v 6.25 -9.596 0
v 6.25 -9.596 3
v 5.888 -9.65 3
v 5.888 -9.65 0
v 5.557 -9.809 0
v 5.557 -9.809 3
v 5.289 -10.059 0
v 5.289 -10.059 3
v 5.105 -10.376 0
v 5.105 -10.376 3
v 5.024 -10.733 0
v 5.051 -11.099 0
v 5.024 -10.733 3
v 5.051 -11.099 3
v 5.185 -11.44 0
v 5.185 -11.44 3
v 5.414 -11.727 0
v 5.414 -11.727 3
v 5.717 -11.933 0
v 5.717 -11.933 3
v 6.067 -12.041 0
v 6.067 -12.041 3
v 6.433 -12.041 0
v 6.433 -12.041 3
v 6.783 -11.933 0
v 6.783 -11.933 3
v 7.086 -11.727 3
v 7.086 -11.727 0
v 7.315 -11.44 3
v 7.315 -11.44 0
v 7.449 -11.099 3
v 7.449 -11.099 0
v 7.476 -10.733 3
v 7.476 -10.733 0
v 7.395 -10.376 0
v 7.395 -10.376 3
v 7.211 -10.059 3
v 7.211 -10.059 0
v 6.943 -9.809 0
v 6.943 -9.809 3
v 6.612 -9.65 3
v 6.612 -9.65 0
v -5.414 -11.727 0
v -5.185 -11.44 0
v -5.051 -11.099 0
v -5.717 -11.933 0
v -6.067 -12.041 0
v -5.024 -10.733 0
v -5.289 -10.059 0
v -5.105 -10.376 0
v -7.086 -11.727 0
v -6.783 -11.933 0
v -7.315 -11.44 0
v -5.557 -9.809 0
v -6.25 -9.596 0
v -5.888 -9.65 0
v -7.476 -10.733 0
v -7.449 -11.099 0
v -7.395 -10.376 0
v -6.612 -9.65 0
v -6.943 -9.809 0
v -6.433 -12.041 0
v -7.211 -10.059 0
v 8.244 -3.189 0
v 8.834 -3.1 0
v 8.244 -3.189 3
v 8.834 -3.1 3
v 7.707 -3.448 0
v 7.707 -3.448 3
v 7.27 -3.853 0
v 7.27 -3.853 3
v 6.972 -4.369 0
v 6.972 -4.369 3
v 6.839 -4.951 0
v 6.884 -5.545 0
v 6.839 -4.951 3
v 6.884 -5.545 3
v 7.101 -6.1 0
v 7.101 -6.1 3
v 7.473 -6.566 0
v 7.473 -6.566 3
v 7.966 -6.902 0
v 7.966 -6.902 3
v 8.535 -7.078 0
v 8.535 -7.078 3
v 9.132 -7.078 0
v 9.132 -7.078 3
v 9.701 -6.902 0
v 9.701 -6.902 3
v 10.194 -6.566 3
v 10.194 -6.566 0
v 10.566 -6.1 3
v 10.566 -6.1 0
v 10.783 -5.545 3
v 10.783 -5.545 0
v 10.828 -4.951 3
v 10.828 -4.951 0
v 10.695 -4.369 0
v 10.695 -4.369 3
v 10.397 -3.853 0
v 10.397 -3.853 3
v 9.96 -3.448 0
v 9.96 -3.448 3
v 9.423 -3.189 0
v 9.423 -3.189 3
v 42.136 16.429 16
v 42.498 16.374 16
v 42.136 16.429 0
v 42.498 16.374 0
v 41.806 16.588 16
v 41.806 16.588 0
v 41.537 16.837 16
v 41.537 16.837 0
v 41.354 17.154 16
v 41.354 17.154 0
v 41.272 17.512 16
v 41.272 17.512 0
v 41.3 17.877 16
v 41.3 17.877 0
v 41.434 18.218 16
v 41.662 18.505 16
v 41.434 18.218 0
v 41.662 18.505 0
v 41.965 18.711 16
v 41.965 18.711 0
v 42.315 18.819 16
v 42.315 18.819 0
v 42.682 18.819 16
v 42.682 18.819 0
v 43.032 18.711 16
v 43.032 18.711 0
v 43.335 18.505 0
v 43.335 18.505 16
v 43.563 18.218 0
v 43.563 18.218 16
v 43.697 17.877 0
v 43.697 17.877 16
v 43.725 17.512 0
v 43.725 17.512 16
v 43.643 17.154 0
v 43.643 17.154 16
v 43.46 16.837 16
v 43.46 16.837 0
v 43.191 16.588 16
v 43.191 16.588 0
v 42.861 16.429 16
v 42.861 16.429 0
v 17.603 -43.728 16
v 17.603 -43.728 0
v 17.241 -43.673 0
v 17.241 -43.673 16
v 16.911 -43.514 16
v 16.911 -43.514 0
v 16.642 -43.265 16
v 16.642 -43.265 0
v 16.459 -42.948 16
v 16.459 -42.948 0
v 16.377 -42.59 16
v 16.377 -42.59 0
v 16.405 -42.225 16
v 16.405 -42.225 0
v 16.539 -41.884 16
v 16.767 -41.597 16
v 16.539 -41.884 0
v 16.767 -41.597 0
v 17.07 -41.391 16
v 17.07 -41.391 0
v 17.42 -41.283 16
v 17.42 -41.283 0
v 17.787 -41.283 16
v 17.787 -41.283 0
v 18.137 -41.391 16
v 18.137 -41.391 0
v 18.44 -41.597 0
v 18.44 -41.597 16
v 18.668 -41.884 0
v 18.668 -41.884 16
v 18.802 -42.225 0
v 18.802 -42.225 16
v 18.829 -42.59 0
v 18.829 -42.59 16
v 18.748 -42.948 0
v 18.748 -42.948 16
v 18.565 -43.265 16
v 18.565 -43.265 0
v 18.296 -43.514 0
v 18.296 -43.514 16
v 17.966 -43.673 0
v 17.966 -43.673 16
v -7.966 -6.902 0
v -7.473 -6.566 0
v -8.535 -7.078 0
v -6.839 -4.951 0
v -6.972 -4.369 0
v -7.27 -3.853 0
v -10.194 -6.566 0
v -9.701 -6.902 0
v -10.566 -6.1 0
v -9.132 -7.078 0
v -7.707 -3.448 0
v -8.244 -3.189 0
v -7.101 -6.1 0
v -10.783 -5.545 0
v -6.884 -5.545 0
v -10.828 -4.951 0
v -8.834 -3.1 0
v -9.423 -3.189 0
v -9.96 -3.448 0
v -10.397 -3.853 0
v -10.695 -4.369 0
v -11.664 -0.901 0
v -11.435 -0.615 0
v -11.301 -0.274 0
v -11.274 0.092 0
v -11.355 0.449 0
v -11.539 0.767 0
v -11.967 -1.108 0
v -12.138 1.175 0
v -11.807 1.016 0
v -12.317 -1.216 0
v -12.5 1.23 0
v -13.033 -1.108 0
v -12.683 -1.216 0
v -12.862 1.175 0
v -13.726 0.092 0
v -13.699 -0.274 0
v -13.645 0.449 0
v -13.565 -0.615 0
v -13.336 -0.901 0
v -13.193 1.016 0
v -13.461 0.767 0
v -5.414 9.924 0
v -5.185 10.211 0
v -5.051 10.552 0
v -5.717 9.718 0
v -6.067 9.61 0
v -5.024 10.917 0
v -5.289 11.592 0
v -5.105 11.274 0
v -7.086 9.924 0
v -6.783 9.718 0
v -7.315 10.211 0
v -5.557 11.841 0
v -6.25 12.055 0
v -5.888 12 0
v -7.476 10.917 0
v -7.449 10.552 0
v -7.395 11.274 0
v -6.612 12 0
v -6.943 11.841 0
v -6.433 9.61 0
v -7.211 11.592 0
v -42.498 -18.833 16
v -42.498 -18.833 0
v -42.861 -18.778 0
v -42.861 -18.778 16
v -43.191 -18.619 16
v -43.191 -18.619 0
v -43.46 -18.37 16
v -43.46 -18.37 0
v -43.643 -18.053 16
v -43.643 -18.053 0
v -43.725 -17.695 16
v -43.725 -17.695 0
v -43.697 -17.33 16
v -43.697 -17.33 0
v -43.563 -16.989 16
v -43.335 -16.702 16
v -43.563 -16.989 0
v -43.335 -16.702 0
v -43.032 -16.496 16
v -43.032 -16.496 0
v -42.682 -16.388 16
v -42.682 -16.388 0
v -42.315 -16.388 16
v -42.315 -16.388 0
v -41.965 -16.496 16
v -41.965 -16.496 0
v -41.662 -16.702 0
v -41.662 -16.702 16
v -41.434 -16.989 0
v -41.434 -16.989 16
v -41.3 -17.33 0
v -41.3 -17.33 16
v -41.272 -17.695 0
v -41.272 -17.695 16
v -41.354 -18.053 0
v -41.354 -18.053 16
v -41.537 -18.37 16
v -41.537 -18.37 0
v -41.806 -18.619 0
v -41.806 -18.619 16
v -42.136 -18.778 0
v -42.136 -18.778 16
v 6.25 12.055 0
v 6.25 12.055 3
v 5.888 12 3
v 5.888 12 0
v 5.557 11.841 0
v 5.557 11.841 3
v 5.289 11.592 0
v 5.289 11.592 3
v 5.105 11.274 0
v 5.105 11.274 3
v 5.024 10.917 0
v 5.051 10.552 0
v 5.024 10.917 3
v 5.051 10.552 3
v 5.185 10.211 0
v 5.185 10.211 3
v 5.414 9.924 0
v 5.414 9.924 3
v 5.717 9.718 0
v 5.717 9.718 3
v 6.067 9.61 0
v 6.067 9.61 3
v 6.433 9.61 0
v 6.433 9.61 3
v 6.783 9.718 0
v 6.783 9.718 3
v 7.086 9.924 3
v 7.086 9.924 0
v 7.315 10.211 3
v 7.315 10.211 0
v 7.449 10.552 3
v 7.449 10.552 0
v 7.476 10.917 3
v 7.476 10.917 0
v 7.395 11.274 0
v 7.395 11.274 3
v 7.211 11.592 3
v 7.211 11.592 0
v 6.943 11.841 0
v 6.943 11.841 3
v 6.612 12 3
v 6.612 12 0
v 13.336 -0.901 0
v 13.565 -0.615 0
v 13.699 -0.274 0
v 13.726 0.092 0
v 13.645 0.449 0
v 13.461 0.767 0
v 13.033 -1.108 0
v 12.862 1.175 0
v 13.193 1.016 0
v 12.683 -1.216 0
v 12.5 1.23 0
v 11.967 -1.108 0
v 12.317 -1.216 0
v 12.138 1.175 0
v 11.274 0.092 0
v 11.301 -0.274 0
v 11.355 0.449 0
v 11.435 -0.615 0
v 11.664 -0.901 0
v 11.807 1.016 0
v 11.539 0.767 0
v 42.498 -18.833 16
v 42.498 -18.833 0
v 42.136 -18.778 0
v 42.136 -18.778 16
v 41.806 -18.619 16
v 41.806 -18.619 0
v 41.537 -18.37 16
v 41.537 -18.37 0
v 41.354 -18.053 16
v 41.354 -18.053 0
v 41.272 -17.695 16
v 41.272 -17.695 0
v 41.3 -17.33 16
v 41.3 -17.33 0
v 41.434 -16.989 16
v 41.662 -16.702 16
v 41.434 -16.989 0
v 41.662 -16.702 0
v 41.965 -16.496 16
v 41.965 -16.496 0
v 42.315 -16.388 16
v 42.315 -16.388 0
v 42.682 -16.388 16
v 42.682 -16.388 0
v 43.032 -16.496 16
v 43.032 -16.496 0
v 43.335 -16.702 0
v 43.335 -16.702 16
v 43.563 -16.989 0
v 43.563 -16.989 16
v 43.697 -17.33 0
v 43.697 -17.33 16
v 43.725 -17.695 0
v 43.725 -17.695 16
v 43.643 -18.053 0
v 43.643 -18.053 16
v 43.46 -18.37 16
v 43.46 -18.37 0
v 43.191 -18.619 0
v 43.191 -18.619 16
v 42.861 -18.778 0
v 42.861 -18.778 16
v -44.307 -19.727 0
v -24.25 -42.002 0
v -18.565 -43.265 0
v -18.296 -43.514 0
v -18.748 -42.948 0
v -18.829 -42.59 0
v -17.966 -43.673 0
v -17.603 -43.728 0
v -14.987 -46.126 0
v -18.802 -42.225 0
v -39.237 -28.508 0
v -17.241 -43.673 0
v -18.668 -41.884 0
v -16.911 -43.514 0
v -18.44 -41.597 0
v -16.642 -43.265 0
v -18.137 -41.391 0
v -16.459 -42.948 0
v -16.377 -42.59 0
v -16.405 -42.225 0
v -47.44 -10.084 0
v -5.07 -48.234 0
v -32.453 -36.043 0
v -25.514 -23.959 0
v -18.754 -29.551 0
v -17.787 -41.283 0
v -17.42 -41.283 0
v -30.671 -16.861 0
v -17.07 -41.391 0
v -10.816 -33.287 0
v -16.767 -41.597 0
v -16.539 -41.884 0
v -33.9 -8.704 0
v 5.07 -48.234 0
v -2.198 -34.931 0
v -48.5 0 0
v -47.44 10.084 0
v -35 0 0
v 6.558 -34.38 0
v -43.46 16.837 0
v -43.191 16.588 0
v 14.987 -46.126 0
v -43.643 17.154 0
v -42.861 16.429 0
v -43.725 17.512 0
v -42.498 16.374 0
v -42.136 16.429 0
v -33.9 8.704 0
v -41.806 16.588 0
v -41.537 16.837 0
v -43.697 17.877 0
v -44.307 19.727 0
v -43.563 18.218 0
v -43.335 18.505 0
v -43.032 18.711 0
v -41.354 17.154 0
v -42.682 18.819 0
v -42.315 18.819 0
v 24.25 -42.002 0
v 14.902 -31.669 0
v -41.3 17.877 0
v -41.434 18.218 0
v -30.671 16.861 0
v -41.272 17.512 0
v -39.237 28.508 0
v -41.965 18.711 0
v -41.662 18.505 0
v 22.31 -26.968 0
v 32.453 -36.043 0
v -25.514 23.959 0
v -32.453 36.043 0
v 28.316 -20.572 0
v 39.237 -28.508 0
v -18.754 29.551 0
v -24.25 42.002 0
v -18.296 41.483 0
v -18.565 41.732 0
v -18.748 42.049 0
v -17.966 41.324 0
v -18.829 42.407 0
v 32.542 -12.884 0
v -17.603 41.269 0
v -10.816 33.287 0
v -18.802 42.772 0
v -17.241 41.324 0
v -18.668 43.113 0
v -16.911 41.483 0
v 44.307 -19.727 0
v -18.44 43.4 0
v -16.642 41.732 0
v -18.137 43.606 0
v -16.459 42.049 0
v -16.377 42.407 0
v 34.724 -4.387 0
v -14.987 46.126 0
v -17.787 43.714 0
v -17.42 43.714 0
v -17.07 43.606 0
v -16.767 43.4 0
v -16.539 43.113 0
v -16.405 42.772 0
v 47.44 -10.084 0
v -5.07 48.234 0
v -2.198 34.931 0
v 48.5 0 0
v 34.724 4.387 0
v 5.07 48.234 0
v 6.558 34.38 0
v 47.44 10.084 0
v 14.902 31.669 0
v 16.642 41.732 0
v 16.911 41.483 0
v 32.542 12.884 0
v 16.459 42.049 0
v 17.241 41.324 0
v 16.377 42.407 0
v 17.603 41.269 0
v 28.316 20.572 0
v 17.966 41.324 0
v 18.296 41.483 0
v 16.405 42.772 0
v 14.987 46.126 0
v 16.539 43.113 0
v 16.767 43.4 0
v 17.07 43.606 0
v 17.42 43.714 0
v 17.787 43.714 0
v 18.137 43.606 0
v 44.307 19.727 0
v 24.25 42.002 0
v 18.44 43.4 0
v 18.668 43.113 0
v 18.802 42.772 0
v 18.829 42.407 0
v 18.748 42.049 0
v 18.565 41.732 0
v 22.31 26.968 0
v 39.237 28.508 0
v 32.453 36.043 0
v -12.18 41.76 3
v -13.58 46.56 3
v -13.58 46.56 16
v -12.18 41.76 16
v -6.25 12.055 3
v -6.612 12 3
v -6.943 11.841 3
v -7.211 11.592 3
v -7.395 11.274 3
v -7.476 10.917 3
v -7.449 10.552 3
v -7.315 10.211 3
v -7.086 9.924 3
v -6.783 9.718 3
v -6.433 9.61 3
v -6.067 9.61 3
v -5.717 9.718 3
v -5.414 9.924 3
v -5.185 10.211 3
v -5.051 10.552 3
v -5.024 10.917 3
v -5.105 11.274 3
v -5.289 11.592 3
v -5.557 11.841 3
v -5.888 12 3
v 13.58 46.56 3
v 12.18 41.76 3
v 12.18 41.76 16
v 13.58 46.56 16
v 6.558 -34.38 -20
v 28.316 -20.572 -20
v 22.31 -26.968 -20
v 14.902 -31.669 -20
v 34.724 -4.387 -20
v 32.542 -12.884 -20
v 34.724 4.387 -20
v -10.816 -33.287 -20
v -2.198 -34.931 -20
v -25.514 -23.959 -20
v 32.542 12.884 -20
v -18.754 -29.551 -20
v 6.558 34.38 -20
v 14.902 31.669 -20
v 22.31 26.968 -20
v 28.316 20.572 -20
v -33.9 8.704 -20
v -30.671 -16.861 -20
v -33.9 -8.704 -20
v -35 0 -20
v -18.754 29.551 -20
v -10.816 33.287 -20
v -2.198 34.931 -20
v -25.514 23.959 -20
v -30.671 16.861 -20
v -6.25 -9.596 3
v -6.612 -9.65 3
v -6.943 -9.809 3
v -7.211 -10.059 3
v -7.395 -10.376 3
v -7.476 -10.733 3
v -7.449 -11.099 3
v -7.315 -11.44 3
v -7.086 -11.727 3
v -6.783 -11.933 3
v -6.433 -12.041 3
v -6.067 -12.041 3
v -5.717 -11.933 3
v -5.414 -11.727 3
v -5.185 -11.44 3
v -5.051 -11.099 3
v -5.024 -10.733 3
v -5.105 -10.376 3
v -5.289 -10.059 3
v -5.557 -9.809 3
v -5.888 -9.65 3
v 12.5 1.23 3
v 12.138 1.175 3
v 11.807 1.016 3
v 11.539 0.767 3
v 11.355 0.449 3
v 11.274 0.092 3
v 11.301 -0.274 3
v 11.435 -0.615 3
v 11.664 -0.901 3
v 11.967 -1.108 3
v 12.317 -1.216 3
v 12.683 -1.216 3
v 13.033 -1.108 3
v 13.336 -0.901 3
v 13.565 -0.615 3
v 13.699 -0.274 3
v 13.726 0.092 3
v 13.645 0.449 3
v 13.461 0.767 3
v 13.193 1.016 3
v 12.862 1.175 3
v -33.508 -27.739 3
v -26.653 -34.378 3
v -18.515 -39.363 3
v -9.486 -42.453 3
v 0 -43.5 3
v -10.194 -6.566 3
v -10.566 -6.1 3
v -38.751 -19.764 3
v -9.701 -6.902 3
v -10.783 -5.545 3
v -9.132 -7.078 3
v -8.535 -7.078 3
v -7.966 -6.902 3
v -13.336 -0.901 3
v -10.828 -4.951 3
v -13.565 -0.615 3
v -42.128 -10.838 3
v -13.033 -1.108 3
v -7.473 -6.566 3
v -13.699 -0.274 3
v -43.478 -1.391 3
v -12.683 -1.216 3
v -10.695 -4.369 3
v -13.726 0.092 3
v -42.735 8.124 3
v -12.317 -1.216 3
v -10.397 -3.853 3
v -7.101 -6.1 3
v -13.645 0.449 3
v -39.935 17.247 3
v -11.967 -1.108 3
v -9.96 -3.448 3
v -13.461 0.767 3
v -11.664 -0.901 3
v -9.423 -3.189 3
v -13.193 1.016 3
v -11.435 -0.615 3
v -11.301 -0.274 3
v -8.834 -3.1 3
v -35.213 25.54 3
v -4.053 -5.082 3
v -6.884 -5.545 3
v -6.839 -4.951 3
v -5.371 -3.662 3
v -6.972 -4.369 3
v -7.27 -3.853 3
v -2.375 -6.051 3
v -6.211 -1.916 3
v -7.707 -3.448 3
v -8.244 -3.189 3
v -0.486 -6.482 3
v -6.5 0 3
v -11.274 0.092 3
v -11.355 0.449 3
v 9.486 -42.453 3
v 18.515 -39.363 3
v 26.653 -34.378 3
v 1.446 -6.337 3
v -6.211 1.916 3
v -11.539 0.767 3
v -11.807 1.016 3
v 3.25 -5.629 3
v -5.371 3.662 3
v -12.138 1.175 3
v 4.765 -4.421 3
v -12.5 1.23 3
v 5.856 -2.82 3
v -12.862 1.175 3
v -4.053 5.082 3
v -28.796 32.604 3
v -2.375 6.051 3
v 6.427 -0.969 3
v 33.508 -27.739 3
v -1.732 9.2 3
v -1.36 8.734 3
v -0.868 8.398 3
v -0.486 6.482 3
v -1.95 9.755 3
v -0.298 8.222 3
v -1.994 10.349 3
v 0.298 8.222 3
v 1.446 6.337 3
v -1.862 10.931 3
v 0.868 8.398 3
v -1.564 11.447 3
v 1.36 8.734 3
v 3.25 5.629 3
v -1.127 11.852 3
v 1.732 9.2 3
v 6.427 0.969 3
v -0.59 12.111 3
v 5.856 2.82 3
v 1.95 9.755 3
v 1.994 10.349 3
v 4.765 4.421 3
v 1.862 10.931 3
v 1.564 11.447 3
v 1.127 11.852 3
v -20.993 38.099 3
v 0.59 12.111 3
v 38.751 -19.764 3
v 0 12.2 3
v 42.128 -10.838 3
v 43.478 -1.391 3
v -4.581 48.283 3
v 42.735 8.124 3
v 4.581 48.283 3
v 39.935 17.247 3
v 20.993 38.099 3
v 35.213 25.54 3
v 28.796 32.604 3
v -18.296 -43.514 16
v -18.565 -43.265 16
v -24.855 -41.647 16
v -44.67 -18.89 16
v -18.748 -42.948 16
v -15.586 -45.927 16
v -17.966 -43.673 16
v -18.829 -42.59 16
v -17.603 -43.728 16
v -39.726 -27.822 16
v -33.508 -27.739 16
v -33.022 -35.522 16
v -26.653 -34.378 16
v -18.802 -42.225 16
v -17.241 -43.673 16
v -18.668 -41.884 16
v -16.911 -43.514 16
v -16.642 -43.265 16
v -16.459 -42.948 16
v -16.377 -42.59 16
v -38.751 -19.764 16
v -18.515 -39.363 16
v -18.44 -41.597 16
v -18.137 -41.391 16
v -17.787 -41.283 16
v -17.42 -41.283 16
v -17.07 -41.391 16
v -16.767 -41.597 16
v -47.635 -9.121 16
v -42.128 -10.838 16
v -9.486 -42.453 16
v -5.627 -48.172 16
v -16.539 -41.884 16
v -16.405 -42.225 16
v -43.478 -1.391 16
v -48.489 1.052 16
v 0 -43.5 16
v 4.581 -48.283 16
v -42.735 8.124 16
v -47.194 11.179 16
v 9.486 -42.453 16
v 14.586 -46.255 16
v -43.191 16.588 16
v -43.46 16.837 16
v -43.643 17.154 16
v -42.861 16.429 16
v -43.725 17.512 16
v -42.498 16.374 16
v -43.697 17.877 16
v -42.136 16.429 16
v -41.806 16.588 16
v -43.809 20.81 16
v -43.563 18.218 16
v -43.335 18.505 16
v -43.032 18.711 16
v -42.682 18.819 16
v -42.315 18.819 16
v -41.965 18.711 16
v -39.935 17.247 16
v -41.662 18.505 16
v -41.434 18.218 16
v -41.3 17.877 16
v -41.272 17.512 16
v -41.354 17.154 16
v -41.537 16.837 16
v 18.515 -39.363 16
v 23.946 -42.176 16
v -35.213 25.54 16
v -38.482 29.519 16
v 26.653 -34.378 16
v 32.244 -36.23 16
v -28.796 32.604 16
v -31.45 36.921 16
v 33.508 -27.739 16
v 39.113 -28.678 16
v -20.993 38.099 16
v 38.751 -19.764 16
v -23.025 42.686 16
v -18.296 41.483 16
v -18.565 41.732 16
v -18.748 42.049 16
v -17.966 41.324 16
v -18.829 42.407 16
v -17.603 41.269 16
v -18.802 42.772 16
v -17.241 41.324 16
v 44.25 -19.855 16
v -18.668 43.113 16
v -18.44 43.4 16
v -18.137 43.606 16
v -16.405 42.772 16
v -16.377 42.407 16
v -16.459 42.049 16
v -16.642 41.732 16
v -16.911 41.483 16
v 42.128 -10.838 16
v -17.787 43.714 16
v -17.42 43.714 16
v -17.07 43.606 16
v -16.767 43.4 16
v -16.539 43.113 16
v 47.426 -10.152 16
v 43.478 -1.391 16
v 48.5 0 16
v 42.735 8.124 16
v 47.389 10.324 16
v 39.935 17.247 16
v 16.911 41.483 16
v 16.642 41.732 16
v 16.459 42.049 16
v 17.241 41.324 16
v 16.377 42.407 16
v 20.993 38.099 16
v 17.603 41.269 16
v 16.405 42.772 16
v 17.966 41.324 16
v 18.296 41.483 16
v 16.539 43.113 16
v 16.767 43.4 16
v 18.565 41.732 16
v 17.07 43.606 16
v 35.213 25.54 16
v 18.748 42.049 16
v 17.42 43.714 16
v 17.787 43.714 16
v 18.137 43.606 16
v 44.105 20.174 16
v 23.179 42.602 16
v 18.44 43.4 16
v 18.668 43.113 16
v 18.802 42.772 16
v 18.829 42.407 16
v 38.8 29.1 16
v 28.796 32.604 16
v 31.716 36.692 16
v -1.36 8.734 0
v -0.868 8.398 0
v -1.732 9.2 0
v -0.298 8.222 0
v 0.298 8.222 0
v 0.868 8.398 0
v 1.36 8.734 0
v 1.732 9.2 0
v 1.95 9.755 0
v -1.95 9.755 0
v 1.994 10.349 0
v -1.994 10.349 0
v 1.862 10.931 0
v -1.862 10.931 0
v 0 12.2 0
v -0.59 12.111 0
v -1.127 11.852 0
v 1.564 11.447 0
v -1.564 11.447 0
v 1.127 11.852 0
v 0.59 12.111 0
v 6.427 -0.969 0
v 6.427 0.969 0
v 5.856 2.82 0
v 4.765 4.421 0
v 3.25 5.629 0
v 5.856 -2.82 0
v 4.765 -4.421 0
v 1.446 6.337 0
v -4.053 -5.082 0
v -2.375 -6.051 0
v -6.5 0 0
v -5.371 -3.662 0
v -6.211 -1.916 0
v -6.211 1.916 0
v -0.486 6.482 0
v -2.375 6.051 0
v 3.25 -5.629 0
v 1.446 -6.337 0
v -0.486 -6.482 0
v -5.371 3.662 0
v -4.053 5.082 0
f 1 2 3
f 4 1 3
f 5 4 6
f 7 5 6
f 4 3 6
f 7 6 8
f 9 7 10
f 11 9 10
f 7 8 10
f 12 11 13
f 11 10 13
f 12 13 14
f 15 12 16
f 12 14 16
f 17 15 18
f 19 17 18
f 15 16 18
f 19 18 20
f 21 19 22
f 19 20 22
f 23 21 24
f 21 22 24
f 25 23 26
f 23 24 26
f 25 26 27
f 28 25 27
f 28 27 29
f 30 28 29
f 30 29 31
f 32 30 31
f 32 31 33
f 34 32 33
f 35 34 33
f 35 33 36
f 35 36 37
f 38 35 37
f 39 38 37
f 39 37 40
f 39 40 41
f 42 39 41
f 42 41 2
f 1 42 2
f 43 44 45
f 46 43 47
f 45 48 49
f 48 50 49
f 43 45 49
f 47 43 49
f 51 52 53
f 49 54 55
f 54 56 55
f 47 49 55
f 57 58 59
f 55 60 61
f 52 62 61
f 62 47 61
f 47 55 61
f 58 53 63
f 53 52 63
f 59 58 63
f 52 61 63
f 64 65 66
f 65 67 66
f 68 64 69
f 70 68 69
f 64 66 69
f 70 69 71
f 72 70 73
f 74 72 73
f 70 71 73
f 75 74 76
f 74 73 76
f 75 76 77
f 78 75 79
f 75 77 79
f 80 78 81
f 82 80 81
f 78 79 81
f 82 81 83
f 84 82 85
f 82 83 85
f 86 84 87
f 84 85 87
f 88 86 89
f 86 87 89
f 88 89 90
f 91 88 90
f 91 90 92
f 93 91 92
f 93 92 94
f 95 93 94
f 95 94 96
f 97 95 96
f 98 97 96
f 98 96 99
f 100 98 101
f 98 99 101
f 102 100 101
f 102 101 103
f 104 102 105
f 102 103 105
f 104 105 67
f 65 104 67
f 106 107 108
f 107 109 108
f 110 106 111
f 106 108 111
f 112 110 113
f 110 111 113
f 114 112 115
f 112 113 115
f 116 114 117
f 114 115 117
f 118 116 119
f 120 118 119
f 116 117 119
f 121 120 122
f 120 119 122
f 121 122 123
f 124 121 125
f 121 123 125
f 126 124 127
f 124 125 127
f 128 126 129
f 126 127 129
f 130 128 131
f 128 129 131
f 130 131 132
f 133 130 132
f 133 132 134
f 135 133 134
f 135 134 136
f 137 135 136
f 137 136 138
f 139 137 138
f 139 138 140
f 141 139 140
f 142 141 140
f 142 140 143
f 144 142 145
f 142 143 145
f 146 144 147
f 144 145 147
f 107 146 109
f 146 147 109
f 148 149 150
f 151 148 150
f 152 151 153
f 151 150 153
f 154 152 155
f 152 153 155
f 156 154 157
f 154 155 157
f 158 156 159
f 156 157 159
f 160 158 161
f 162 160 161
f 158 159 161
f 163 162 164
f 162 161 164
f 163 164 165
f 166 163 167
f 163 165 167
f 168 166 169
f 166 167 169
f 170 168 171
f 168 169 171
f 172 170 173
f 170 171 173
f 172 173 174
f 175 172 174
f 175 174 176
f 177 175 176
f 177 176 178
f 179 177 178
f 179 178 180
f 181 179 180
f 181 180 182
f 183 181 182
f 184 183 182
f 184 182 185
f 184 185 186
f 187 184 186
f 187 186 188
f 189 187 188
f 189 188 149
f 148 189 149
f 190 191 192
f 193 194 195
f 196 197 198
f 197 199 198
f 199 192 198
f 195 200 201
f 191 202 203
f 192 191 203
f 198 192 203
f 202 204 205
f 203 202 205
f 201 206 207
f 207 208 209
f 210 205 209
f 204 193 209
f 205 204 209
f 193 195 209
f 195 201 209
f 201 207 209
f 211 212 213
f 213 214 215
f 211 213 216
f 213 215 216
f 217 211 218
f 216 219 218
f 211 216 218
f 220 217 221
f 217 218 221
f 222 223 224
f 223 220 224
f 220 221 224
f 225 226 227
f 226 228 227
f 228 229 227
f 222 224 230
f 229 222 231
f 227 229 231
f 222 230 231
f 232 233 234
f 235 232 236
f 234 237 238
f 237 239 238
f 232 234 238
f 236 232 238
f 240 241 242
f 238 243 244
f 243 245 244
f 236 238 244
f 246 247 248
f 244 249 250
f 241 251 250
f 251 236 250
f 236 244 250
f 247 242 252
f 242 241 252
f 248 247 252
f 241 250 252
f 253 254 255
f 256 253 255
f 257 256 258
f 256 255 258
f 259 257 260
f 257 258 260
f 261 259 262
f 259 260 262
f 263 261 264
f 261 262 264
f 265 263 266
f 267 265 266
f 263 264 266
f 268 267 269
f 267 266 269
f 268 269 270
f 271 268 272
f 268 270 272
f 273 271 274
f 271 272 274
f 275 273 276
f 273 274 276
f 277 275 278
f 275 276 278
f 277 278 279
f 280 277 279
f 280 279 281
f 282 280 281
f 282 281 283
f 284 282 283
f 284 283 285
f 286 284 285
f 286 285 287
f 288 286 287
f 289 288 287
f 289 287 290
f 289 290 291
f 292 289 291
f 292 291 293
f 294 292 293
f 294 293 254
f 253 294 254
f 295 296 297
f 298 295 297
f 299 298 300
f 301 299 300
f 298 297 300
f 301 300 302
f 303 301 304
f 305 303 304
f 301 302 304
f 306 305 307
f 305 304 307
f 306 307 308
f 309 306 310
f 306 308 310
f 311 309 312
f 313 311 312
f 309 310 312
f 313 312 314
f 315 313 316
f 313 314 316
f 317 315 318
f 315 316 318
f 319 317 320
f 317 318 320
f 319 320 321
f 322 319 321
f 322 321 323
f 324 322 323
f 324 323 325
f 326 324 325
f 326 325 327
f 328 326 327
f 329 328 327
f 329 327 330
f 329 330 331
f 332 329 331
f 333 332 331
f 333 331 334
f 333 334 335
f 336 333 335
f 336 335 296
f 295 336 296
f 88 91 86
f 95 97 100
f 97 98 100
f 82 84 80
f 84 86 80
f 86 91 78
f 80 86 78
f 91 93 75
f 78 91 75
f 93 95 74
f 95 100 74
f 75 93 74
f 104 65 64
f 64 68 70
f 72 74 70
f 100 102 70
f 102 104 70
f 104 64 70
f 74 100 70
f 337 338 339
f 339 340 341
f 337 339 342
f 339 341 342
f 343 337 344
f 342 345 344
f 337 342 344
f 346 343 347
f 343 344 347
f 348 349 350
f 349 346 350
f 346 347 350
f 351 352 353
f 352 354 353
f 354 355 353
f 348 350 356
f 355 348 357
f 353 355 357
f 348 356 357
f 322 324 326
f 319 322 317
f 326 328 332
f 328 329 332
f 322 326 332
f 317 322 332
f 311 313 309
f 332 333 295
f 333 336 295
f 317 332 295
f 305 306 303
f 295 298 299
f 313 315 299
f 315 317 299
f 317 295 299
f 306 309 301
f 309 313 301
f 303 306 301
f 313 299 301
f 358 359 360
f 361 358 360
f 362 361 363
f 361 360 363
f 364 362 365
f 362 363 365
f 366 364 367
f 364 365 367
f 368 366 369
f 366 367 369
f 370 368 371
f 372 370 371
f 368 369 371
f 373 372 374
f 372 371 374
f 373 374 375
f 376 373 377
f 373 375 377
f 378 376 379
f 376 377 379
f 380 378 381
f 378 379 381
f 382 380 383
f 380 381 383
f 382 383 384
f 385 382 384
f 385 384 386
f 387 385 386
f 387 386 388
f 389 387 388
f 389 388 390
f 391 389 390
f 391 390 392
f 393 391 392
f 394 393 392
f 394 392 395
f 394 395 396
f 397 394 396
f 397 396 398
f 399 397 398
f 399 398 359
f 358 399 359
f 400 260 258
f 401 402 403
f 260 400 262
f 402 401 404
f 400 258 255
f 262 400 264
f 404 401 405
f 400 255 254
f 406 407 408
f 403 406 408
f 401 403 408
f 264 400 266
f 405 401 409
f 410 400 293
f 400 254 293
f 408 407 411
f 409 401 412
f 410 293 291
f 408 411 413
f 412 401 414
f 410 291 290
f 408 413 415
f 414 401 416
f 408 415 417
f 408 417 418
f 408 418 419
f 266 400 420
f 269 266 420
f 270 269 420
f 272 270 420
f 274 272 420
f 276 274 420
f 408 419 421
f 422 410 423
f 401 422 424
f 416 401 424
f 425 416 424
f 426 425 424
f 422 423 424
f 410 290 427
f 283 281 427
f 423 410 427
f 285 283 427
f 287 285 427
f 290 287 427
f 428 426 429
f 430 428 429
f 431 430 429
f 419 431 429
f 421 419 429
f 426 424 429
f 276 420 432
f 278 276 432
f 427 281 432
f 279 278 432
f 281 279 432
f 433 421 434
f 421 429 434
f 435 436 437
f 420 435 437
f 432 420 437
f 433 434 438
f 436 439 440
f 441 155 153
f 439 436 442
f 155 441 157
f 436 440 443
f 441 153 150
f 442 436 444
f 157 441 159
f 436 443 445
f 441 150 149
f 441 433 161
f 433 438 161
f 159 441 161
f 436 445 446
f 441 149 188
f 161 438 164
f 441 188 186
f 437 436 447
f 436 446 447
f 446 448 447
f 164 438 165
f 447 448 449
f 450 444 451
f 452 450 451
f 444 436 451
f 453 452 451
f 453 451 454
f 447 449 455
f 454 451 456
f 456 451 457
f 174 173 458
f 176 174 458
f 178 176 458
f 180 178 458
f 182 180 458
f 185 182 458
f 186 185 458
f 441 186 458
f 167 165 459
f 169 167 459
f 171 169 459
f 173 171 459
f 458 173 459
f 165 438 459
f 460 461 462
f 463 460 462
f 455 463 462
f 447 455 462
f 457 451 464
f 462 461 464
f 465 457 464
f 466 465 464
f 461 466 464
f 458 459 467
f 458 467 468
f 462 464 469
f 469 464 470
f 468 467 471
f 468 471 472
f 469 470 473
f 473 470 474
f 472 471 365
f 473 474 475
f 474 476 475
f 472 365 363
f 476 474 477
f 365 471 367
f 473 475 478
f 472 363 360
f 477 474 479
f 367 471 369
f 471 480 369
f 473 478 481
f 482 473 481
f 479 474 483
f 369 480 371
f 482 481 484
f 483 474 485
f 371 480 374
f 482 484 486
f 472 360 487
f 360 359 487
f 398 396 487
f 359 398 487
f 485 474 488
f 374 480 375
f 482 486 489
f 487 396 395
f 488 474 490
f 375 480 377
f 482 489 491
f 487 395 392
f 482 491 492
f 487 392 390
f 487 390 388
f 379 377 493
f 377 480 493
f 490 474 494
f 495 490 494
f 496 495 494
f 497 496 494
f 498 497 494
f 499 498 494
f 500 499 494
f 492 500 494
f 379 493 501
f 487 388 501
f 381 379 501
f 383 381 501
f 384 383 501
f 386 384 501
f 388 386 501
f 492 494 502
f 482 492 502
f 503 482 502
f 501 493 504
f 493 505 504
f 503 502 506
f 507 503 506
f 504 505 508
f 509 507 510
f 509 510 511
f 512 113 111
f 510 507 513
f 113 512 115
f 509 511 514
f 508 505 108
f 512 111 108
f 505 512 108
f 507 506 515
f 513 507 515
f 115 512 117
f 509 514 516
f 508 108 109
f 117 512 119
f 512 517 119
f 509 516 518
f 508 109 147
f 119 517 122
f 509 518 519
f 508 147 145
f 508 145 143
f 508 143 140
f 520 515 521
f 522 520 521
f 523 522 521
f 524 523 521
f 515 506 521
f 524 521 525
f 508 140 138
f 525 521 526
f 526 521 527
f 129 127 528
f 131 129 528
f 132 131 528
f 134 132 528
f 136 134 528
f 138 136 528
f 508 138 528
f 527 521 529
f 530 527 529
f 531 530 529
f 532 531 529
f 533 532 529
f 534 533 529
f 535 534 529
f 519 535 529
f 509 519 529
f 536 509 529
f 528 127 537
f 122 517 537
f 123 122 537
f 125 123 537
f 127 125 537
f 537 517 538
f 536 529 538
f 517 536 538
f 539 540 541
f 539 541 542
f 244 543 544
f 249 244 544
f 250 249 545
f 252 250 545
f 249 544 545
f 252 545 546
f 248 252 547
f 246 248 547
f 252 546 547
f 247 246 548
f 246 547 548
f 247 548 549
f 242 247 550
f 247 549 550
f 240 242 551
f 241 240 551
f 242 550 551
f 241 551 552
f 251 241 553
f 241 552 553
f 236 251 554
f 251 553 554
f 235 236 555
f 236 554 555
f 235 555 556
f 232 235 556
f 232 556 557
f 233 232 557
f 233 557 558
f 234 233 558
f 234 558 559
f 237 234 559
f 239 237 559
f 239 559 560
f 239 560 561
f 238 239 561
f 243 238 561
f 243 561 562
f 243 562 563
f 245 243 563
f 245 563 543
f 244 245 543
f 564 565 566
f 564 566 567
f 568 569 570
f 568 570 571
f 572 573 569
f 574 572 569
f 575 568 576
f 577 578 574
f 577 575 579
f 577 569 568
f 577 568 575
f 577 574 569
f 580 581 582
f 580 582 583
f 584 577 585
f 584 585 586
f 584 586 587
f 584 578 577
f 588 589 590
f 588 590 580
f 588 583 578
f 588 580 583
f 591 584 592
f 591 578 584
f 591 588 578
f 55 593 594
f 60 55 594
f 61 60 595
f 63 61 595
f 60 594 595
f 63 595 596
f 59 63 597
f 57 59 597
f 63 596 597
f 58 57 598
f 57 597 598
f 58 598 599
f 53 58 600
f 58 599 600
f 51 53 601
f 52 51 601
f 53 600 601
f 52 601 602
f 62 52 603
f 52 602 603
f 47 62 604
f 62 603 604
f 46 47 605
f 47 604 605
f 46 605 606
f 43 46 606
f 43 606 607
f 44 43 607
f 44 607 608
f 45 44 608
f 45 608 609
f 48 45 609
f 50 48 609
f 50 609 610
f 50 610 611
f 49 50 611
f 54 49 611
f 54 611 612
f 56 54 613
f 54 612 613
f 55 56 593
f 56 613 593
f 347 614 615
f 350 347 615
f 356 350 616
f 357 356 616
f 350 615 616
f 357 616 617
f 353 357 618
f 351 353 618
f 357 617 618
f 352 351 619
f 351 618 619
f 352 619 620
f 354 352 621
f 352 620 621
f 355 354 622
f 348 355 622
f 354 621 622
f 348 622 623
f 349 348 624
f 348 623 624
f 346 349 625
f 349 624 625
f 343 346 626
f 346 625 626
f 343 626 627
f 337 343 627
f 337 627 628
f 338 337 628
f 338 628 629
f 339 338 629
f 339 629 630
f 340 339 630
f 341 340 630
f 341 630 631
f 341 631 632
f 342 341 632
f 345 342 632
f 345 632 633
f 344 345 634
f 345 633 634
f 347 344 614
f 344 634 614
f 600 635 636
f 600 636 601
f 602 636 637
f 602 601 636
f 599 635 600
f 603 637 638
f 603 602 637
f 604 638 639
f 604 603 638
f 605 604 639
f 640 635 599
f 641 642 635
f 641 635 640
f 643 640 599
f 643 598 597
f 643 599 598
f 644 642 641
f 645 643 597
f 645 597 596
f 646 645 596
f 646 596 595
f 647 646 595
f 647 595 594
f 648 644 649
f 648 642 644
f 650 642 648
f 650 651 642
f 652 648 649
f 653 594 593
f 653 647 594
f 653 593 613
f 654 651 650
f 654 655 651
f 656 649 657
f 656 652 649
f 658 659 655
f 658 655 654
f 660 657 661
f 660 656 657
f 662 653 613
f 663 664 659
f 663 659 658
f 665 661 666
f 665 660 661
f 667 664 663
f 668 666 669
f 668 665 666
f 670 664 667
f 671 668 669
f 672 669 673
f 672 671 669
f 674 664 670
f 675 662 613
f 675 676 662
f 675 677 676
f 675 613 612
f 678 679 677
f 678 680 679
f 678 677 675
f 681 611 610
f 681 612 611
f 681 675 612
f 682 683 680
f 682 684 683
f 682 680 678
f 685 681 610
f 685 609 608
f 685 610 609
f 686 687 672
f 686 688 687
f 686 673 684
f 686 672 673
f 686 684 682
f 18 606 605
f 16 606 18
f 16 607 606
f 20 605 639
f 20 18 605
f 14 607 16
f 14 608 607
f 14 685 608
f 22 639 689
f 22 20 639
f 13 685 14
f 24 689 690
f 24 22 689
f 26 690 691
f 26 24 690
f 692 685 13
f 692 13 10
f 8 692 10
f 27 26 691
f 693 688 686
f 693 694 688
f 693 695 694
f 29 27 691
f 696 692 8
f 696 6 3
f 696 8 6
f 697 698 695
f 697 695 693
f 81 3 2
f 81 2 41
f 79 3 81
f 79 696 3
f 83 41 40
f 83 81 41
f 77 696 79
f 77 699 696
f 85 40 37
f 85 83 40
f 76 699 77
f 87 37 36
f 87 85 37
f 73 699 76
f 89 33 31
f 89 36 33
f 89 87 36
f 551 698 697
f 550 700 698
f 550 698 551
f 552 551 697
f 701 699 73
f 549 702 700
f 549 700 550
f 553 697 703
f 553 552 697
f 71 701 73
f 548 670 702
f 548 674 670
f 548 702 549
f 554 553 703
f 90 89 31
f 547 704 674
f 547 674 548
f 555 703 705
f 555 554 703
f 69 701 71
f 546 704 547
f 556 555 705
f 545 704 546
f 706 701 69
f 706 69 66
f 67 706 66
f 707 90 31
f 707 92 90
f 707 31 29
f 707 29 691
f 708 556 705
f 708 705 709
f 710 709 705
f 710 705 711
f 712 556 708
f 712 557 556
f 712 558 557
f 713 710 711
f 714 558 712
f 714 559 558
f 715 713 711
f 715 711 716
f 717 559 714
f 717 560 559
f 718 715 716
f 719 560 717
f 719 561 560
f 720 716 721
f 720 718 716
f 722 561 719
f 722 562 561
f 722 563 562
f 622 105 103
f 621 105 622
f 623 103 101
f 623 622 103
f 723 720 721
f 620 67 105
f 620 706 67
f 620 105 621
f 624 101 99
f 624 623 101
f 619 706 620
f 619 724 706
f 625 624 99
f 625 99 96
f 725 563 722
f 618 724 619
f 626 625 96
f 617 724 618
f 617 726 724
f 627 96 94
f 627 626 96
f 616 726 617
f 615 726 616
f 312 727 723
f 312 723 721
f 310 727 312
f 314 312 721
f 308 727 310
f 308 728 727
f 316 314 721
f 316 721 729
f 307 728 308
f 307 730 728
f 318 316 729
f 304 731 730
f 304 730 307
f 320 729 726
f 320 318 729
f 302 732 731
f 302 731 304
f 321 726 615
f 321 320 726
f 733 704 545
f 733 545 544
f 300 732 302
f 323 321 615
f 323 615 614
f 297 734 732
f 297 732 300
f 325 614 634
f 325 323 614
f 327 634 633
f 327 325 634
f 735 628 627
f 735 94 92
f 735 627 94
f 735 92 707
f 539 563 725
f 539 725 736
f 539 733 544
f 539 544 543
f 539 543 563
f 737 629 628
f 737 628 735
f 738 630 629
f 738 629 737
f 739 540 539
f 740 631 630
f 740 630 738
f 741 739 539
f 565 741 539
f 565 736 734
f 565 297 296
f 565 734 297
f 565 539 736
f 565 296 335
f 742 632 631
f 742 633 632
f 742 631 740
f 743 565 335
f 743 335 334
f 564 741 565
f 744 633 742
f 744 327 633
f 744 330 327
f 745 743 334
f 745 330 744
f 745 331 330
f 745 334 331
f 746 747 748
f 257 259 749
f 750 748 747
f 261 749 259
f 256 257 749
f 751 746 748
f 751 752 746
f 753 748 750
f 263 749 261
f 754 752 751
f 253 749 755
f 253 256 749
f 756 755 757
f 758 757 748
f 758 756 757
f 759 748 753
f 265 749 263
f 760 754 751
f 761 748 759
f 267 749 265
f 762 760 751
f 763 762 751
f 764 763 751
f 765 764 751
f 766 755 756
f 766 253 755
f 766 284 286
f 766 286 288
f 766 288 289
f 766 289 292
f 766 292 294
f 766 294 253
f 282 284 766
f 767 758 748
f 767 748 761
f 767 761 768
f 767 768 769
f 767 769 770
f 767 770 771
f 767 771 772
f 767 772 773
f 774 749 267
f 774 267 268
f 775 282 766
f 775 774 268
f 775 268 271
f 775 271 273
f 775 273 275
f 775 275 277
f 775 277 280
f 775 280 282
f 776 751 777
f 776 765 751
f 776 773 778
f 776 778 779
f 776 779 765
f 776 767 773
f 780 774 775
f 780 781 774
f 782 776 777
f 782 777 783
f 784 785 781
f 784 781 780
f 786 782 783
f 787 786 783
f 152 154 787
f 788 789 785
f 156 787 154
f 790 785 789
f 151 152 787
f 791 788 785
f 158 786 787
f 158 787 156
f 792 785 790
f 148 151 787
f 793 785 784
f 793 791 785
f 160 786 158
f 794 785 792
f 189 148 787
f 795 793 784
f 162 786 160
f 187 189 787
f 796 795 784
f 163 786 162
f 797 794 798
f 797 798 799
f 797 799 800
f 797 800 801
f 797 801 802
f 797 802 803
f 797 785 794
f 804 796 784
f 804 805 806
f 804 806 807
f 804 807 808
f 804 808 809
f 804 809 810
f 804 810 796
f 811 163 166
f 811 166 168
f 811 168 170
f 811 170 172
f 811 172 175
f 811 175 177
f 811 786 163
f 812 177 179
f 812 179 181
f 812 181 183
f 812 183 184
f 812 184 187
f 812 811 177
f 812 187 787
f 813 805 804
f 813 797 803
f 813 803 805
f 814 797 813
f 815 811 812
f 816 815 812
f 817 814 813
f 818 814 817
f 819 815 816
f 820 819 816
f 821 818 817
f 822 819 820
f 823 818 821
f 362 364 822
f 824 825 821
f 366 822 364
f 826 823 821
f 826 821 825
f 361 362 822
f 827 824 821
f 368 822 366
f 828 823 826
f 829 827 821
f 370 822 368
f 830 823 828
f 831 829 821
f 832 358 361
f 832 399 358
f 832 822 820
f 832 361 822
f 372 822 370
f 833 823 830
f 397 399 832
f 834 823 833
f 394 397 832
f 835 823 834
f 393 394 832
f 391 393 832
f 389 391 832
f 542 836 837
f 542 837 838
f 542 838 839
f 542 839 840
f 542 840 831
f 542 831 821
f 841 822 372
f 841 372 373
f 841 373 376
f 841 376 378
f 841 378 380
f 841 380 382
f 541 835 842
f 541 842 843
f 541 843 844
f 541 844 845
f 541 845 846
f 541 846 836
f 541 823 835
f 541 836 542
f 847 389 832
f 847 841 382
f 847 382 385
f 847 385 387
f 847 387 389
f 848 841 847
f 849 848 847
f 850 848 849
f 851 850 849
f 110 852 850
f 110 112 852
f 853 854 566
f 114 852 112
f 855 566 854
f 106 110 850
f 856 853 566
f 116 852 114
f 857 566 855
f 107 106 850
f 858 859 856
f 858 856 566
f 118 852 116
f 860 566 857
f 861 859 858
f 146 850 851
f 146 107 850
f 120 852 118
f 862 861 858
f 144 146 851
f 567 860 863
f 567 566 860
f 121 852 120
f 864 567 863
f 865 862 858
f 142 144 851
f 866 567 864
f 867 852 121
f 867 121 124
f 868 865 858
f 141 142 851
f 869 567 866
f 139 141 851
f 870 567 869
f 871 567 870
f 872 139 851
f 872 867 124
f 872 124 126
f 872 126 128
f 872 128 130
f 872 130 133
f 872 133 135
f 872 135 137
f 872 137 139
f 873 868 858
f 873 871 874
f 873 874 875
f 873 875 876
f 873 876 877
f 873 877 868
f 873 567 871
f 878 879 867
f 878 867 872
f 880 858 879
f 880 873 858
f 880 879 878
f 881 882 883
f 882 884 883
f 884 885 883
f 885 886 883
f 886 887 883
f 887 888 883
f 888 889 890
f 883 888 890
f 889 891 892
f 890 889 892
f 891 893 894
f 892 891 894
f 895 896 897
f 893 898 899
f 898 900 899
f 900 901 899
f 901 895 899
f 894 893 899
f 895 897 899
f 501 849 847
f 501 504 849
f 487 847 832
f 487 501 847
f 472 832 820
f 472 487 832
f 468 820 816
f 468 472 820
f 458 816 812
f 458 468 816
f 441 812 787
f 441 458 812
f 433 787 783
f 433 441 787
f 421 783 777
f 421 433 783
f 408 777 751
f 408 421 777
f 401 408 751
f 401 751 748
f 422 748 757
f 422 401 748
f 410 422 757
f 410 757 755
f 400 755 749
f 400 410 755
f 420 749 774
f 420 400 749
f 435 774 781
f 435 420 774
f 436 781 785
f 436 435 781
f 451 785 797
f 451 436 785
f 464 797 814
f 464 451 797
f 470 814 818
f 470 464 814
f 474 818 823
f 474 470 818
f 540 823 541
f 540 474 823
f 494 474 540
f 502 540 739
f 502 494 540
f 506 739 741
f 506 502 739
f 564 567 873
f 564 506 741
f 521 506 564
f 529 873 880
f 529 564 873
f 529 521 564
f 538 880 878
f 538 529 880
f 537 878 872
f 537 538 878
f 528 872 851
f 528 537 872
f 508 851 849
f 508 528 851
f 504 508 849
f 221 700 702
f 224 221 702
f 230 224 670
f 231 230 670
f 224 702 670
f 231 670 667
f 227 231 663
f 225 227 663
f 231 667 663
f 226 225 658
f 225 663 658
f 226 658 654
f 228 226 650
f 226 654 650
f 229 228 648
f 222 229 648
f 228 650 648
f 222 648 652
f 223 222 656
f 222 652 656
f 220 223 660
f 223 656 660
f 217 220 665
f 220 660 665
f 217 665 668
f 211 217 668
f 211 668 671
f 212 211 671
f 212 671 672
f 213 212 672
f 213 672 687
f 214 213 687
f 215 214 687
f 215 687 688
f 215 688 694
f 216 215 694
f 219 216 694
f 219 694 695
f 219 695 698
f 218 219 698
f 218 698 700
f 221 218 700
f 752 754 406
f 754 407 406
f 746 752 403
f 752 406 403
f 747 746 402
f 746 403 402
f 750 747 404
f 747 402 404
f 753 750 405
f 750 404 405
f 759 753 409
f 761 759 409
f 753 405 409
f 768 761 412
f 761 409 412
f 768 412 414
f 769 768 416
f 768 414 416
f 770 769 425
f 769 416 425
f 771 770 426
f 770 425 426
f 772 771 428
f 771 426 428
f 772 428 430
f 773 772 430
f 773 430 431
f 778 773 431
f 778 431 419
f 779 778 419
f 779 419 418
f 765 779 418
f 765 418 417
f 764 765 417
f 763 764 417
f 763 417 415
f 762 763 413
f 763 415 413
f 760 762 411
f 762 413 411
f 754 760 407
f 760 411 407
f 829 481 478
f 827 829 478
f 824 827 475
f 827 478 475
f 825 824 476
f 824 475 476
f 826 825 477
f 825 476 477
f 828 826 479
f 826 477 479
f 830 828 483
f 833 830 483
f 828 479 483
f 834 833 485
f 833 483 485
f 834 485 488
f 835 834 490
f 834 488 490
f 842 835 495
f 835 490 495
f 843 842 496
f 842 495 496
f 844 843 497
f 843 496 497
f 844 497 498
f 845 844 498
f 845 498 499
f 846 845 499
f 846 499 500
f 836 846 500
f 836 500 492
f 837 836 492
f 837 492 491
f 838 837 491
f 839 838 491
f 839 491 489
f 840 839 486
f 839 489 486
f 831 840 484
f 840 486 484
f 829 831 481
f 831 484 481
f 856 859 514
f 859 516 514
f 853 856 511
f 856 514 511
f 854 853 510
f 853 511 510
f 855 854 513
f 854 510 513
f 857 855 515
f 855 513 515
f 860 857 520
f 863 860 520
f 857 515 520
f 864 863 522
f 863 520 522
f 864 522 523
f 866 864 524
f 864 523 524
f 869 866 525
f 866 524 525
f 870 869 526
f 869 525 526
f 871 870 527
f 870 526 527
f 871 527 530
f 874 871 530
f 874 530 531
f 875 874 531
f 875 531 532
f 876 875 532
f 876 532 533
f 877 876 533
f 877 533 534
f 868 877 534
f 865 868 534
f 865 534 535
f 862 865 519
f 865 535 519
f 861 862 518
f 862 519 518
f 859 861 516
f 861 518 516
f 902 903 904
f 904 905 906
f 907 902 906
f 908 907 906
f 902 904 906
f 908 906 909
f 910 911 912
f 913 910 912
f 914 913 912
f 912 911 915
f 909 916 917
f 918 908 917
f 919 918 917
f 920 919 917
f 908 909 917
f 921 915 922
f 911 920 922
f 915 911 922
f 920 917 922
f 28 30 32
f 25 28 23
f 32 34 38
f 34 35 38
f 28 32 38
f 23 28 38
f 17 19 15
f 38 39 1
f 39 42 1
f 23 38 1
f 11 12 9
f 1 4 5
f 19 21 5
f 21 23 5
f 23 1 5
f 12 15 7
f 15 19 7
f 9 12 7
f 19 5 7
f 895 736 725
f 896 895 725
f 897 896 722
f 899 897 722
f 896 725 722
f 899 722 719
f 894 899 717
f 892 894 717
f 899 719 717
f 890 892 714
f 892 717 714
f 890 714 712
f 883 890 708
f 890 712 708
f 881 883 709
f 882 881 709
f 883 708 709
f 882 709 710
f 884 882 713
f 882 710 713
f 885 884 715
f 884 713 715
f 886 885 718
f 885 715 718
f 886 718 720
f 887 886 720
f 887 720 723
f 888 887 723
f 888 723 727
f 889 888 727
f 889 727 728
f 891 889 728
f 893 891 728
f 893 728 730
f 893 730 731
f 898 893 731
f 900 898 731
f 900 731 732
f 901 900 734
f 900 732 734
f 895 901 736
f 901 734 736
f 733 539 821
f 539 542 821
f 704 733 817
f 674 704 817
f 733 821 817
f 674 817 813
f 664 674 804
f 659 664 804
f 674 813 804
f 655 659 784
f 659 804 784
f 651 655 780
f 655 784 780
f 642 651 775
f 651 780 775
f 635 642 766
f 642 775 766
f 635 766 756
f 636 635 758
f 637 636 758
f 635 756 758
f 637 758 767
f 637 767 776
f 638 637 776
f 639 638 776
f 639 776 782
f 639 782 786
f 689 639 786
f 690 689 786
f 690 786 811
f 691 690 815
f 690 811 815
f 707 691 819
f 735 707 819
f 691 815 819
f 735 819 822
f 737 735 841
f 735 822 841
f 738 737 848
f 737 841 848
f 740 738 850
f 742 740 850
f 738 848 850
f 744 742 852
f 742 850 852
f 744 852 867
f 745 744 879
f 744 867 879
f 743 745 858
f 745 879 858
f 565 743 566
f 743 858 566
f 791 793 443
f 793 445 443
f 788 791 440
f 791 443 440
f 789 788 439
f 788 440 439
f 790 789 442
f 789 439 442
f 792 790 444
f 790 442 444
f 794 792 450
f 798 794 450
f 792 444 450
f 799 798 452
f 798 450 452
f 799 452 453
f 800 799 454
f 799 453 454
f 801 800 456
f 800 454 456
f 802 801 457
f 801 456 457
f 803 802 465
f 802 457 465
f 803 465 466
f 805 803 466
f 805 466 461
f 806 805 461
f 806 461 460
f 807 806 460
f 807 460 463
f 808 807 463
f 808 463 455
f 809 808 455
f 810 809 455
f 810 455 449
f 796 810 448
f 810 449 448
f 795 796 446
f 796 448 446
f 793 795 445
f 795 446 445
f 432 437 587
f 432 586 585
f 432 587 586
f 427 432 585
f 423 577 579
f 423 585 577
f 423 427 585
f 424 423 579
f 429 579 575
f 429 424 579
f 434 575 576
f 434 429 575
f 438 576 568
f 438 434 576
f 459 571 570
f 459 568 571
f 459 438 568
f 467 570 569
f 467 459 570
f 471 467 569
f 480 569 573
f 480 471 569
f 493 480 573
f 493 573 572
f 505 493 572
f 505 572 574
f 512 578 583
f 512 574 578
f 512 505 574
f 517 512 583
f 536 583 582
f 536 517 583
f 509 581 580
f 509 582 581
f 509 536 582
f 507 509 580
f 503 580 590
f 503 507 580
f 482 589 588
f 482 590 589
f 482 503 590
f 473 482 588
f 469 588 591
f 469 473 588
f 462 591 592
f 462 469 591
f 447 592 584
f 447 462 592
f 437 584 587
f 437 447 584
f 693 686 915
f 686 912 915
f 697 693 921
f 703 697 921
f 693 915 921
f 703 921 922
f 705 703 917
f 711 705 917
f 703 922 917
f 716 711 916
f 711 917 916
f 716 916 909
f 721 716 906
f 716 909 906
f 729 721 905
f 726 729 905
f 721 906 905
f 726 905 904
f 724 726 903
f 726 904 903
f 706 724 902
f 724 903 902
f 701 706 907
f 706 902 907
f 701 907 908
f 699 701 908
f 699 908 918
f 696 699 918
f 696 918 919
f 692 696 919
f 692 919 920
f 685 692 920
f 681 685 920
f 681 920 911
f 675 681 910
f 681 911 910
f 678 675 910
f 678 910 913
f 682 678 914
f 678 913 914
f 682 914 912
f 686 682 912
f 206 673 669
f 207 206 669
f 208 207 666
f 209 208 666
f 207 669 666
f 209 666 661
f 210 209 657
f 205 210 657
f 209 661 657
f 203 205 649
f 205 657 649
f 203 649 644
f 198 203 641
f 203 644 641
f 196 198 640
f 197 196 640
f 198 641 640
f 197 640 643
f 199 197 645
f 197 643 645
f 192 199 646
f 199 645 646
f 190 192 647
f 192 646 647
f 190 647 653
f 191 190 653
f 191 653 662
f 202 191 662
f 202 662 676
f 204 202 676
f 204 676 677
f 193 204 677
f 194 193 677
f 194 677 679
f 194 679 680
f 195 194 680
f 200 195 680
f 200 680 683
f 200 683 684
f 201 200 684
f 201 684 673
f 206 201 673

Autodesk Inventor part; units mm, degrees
ref_plane "YZ Plane" through (0, 0, 0) normal (1, 0, 0) x (0, 1, 0)
ref_plane "XZ Plane" through (0, 0, 0) normal (0, 1, 0) x (-1, 0, 0)
ref_plane "XY Plane" through (0, 0, 0) normal (0, 0, 1) x (1, 0, 0)
sketch "スケッチ1" plane through (0, 0, 0) normal (0, 0, 1) x (1, 0, 0)
  circle A0 centre (0, 0) radius 48.5
  dimension "d0" = 97
extrude "押し出し1" add sketch "スケッチ1" along normal blind 24
sketch "スケッチ2" plane through (0, 0, 24) normal (0, 0, 1) x (1, 0, 0)
  line L0 (0, 0) -> (-27.4547, 66.2816)
  line L1 (0, 0) -> (26.2443, 63.3594)
  circle A0 centre (0, 0) radius 46
  line L2 (0, 0) -> (0, 57.2216)
  point P0 (-17.6034, 42.4985)
  point P1 (17.6034, 42.4985)
  point P2 (-42.4985, -17.6034)
  point P3 (-42.4985, 17.6034)
  point P4 (17.6034, -42.4985)
  point P5 (-17.6034, -42.4985)
  point P6 (42.4985, 17.6034)
  point P7 (42.4985, -17.6034)
  dimension "d3" = 92
  dimension "d4" = 45
  dimension "d8" = 360
  dimension "d45" = 22.5
hole "穴1" at (-17.6034, 42.4985, 24) at (17.6034, 42.4985, 24) at (-42.4985, -17.6034, 24) at (-42.4985, 17.6034, 24) at (17.6034, -42.4985, 24) at (-17.6034, -42.4985, 24) at (42.4985, 17.6034, 24) at (42.4985, -17.6034, 24) direction (0, 0, -1) diameter 2.459 end through all
sketch "スケッチ3" plane through (0, 0, 0) normal (0, 0, -1) x (-1, 0, 0)
  circle A0 centre (0, 0) radius 12.5
  line L0 (0, 0) -> (-8.9989, 15.5865)
  line L1 (0, 0) -> (0, 21.1985)
  point P0 (-6.25, 10.8253)
  point P1 (-12.5, 0)
  point P2 (-6.25, -10.8253)
  point P3 (6.25, -10.8253)
  point P4 (12.5, 0)
  point P5 (6.25, 10.8253)
  dimension "d17" = 25
  dimension "d18" = 30
  dimension "d21" = 360
hole "穴2" at (6.25, 10.8253, 0) at (12.5, 0, 0) at (6.25, -10.8253, 0) at (-6.25, -10.8253, 0) at (-12.5, 0, 0) at (-6.25, 10.8253, 0) direction (0, 0, 1) diameter 2.459 end through all
sketch "スケッチ4" plane through (0, 0, 0) normal (0, 0, -1) x (-1, 0, 0)
  circle A0 centre (0, 0) radius 10.2
  point P0 (0, 10.2)
  point P1 (0, 10.2)
  point P2 (-8.8335, -5.1)
  point P3 (8.8335, -5.1)
  dimension "d30" = 20.4
  dimension "d33" = 360
hole "穴3" at (0, 10.2, 0) at (8.8335, -5.1, 0) at (-8.8335, -5.1, 0) direction (0, 0, 1) diameter 4 end through all
sketch "スケッチ5" plane through (0, 0, 24) normal (0, 0, 1) x (1, 0, 0)
  circle A0 centre (0, 0) radius 43.5
  dimension "d42" = 87
extrude "押し出し2" cut sketch "スケッチ5" against normal blind 21
sketch "スケッチ6" plane through (0, 0, 24) normal (0, 0, 1) x (1, 0, 0)
  circle A0 centre (0, 0) radius 48.5 projected
  circle A1 centre (0, 0) radius 43.5 projected
  line L0 (-13.5797, 46.5601) -> (0, 0)
  line L1 (0, 0) -> (13.6731, 46.8801)
  circle A2 centre (-17.6034, 42.4985) radius 1.2295 projected
  circle A3 centre (17.6034, 42.4985) radius 1.2295 projected
  arc A4 (13.5797, 46.5601) -> (-13.5797, 46.5601) centre (0, 0) ccw
  arc A5 (12.1798, 41.7601) -> (-12.1798, 41.7601) centre (0, 0) ccw
  dimension "d46" = 5
  dimension "d47" = 5
extrude "押し出し3" cut sketch "スケッチ6" against normal blind 21 contours L1 A1 L0 A0 picked at (-1.3696, 46.624)
sketch "スケッチ7" plane through (0, 0, 0) normal (0, 0, -1) x (-1, 0, 0)
  circle A0 centre (0, 0) radius 6.5
  dimension "d50" = 13
extrude "押し出し4" cut sketch "スケッチ7" against normal blind 10
sketch "スケッチ8" plane through (0, 0, 24) normal (0, 0, 1) x (1, 0, 0)
  circle A0 centre (0, 0) radius 48.5
extrude "押し出し5" cut sketch "スケッチ8" against normal blind 8
sketch "スケッチ9" plane through (0, 0, 0) normal (0, 0, -1) x (-1, 0, 0)
  circle A0 centre (0, 0) radius 35
  dimension "d55" = 70
extrude "押し出し6" add sketch "スケッチ9" along normal blind 20
sketch "スケッチ10" plane through (0, 0, 3) normal (0, 0, 1) x (1, 0, 0)
  point P0 (0, 0)
properties part number "legparts_01(five)"
